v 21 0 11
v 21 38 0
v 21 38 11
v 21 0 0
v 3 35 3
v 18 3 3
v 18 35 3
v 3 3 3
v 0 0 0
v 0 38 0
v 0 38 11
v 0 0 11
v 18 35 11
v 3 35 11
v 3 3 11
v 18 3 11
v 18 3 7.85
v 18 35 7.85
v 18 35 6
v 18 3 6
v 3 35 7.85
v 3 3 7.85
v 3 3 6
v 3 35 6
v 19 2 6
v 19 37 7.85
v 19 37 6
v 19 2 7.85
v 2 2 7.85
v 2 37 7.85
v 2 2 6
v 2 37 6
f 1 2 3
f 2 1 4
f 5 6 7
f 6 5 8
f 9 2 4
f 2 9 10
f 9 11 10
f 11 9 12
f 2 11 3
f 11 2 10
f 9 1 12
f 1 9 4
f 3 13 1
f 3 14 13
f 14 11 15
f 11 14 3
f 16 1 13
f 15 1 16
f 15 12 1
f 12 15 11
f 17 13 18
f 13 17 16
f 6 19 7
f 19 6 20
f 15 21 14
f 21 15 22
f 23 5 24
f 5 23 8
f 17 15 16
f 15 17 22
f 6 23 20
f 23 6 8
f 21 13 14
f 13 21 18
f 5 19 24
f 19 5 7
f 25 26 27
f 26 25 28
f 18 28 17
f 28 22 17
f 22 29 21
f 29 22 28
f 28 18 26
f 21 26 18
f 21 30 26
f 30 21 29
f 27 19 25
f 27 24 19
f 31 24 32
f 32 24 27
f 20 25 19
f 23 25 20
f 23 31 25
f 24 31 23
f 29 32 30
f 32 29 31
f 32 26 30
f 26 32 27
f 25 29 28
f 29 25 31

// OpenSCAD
$fn = 100; // Resolution for circles

PCBMount(
    pcb_width = 17,
    pcb_depth = 34,
    pcb_thickness = 1.6,
    pcb_mounting_holes = [
        [1.5,1.5],[1.5,1.5]
    ]

);


module PCBMount(pcb_width=10, pcb_depth=10,pcb_thickness=1.6, pcbmounting_holes ){
    // Mount parameters
    base_thickness = 3;
    wall_height = 8;
    wall_thickness = 2;
    clearance = 0.3; // For easier fitting
    
    // Mounting post parameters
    post_height = 3;
    post_outer_diameter = 4.5;
    post_inner_diameter = 2.2; // Slightly smaller than 2.5mm hole for press fit
    
    // Mounting hole positions
    hole_offset_x = 4.5;
    hole_offset_y = 16.5;
    
    difference() {
    difference() {
        union() {
            // Base plate
            color("lightblue", 0.8)
            cube([pcb_width + wall_thickness * 2, 
                  pcb_depth + wall_thickness * 2, 
                  base_thickness]);
            
            // Right wall 
            translate([pcb_width + wall_thickness -1, wall_thickness, 0])
                color("lightblue", 0.8)
                cube([wall_thickness + 1, pcb_depth, base_thickness + wall_height]);
            
            // Left wall 
            translate([0, wall_thickness, 0])
                color("lightblue", 0.8)
                cube([wall_thickness + 1, pcb_depth, base_thickness + wall_height]);

            
            // back wall
            translate([0, 0, 0])
                color("lightblue", 0.8)
                cube([pcb_width + wall_thickness * 2, wall_thickness+ 1, base_thickness + wall_height]);
                
                
                        // back wall
            translate([0, pcb_depth + wall_thickness -1, 0])
                color("lightblue", 0.8)
                cube([pcb_width + wall_thickness * 2, wall_thickness+ 1, base_thickness + wall_height]);
        }
        
    }
    translate([wall_thickness, wall_thickness, base_thickness + post_height]){
    cube([pcb_width,pcb_depth + 1,pcb_thickness + 0.25]);
    }
    }
   
}
